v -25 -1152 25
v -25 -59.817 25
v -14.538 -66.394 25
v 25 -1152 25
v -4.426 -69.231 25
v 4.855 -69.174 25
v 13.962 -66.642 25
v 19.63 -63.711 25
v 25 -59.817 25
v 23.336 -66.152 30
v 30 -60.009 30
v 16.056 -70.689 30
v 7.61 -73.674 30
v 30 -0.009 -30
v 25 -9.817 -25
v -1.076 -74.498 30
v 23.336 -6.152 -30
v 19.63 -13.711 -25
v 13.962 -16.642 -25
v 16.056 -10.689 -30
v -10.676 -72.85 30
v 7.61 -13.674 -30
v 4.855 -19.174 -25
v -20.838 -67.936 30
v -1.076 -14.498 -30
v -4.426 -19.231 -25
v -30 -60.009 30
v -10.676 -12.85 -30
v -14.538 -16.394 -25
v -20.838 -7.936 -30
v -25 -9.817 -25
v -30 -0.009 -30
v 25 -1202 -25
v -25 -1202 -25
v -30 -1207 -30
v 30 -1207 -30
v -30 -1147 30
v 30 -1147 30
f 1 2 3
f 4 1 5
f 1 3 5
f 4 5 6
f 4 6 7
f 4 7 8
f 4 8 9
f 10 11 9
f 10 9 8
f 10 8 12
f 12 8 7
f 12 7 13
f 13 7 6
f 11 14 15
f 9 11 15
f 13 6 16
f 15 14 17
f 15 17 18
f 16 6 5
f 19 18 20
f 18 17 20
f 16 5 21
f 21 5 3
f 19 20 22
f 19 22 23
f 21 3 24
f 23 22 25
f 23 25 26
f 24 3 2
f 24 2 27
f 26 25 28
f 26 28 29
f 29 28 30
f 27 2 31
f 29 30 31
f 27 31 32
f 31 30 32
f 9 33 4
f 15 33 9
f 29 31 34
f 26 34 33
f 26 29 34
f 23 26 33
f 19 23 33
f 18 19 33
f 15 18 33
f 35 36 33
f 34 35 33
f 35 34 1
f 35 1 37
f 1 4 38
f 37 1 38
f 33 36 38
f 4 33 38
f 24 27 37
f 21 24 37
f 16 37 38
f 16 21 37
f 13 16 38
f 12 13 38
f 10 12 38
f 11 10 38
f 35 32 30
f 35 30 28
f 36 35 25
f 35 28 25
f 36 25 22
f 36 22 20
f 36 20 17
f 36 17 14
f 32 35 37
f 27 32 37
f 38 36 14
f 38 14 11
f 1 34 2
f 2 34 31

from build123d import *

# Parameters (mm, degrees)
F0_W     = 60
F0_H     = 60
F0_W_2   = 50
F0_H_2   = 50
F1_DEPTH = 1207
F3_DEPTH = 60.001
F5_R     = 49
F6_DEPTH = 118


with BuildPart() as f1:
    # F0 (on Front) → F1 (new body)
    with BuildSketch(Plane.XZ):
        Rectangle(F0_W, F0_H)
        Rectangle(F0_W_2, F0_H_2, mode=Mode.SUBTRACT)
    extrude(amount=F1_DEPTH)

    # F2 (on face) → F3 (cut, through all)
    with BuildSketch(Plane.YZ.offset(30)):
        Polygon((-1207, 30), (-1207, -30), (-1147, 30), align=None)
        Polygon((0, -30), (0, 30), (-60, 30), align=None)
    extrude(amount=-F3_DEPTH, mode=Mode.SUBTRACT)

    # F5 (on face) → F6 (cut, symmetric)
    with BuildSketch(Plane(origin=(0, -45, 45), x_dir=(-1, 0, 0), z_dir=(0, 0.7071067812, -0.7071067812))):
        with Locations((0, 17.5233952504)):
            Circle(F5_R)
    extrude(amount=F6_DEPTH, both=True, mode=Mode.SUBTRACT)


solid = f1.part
